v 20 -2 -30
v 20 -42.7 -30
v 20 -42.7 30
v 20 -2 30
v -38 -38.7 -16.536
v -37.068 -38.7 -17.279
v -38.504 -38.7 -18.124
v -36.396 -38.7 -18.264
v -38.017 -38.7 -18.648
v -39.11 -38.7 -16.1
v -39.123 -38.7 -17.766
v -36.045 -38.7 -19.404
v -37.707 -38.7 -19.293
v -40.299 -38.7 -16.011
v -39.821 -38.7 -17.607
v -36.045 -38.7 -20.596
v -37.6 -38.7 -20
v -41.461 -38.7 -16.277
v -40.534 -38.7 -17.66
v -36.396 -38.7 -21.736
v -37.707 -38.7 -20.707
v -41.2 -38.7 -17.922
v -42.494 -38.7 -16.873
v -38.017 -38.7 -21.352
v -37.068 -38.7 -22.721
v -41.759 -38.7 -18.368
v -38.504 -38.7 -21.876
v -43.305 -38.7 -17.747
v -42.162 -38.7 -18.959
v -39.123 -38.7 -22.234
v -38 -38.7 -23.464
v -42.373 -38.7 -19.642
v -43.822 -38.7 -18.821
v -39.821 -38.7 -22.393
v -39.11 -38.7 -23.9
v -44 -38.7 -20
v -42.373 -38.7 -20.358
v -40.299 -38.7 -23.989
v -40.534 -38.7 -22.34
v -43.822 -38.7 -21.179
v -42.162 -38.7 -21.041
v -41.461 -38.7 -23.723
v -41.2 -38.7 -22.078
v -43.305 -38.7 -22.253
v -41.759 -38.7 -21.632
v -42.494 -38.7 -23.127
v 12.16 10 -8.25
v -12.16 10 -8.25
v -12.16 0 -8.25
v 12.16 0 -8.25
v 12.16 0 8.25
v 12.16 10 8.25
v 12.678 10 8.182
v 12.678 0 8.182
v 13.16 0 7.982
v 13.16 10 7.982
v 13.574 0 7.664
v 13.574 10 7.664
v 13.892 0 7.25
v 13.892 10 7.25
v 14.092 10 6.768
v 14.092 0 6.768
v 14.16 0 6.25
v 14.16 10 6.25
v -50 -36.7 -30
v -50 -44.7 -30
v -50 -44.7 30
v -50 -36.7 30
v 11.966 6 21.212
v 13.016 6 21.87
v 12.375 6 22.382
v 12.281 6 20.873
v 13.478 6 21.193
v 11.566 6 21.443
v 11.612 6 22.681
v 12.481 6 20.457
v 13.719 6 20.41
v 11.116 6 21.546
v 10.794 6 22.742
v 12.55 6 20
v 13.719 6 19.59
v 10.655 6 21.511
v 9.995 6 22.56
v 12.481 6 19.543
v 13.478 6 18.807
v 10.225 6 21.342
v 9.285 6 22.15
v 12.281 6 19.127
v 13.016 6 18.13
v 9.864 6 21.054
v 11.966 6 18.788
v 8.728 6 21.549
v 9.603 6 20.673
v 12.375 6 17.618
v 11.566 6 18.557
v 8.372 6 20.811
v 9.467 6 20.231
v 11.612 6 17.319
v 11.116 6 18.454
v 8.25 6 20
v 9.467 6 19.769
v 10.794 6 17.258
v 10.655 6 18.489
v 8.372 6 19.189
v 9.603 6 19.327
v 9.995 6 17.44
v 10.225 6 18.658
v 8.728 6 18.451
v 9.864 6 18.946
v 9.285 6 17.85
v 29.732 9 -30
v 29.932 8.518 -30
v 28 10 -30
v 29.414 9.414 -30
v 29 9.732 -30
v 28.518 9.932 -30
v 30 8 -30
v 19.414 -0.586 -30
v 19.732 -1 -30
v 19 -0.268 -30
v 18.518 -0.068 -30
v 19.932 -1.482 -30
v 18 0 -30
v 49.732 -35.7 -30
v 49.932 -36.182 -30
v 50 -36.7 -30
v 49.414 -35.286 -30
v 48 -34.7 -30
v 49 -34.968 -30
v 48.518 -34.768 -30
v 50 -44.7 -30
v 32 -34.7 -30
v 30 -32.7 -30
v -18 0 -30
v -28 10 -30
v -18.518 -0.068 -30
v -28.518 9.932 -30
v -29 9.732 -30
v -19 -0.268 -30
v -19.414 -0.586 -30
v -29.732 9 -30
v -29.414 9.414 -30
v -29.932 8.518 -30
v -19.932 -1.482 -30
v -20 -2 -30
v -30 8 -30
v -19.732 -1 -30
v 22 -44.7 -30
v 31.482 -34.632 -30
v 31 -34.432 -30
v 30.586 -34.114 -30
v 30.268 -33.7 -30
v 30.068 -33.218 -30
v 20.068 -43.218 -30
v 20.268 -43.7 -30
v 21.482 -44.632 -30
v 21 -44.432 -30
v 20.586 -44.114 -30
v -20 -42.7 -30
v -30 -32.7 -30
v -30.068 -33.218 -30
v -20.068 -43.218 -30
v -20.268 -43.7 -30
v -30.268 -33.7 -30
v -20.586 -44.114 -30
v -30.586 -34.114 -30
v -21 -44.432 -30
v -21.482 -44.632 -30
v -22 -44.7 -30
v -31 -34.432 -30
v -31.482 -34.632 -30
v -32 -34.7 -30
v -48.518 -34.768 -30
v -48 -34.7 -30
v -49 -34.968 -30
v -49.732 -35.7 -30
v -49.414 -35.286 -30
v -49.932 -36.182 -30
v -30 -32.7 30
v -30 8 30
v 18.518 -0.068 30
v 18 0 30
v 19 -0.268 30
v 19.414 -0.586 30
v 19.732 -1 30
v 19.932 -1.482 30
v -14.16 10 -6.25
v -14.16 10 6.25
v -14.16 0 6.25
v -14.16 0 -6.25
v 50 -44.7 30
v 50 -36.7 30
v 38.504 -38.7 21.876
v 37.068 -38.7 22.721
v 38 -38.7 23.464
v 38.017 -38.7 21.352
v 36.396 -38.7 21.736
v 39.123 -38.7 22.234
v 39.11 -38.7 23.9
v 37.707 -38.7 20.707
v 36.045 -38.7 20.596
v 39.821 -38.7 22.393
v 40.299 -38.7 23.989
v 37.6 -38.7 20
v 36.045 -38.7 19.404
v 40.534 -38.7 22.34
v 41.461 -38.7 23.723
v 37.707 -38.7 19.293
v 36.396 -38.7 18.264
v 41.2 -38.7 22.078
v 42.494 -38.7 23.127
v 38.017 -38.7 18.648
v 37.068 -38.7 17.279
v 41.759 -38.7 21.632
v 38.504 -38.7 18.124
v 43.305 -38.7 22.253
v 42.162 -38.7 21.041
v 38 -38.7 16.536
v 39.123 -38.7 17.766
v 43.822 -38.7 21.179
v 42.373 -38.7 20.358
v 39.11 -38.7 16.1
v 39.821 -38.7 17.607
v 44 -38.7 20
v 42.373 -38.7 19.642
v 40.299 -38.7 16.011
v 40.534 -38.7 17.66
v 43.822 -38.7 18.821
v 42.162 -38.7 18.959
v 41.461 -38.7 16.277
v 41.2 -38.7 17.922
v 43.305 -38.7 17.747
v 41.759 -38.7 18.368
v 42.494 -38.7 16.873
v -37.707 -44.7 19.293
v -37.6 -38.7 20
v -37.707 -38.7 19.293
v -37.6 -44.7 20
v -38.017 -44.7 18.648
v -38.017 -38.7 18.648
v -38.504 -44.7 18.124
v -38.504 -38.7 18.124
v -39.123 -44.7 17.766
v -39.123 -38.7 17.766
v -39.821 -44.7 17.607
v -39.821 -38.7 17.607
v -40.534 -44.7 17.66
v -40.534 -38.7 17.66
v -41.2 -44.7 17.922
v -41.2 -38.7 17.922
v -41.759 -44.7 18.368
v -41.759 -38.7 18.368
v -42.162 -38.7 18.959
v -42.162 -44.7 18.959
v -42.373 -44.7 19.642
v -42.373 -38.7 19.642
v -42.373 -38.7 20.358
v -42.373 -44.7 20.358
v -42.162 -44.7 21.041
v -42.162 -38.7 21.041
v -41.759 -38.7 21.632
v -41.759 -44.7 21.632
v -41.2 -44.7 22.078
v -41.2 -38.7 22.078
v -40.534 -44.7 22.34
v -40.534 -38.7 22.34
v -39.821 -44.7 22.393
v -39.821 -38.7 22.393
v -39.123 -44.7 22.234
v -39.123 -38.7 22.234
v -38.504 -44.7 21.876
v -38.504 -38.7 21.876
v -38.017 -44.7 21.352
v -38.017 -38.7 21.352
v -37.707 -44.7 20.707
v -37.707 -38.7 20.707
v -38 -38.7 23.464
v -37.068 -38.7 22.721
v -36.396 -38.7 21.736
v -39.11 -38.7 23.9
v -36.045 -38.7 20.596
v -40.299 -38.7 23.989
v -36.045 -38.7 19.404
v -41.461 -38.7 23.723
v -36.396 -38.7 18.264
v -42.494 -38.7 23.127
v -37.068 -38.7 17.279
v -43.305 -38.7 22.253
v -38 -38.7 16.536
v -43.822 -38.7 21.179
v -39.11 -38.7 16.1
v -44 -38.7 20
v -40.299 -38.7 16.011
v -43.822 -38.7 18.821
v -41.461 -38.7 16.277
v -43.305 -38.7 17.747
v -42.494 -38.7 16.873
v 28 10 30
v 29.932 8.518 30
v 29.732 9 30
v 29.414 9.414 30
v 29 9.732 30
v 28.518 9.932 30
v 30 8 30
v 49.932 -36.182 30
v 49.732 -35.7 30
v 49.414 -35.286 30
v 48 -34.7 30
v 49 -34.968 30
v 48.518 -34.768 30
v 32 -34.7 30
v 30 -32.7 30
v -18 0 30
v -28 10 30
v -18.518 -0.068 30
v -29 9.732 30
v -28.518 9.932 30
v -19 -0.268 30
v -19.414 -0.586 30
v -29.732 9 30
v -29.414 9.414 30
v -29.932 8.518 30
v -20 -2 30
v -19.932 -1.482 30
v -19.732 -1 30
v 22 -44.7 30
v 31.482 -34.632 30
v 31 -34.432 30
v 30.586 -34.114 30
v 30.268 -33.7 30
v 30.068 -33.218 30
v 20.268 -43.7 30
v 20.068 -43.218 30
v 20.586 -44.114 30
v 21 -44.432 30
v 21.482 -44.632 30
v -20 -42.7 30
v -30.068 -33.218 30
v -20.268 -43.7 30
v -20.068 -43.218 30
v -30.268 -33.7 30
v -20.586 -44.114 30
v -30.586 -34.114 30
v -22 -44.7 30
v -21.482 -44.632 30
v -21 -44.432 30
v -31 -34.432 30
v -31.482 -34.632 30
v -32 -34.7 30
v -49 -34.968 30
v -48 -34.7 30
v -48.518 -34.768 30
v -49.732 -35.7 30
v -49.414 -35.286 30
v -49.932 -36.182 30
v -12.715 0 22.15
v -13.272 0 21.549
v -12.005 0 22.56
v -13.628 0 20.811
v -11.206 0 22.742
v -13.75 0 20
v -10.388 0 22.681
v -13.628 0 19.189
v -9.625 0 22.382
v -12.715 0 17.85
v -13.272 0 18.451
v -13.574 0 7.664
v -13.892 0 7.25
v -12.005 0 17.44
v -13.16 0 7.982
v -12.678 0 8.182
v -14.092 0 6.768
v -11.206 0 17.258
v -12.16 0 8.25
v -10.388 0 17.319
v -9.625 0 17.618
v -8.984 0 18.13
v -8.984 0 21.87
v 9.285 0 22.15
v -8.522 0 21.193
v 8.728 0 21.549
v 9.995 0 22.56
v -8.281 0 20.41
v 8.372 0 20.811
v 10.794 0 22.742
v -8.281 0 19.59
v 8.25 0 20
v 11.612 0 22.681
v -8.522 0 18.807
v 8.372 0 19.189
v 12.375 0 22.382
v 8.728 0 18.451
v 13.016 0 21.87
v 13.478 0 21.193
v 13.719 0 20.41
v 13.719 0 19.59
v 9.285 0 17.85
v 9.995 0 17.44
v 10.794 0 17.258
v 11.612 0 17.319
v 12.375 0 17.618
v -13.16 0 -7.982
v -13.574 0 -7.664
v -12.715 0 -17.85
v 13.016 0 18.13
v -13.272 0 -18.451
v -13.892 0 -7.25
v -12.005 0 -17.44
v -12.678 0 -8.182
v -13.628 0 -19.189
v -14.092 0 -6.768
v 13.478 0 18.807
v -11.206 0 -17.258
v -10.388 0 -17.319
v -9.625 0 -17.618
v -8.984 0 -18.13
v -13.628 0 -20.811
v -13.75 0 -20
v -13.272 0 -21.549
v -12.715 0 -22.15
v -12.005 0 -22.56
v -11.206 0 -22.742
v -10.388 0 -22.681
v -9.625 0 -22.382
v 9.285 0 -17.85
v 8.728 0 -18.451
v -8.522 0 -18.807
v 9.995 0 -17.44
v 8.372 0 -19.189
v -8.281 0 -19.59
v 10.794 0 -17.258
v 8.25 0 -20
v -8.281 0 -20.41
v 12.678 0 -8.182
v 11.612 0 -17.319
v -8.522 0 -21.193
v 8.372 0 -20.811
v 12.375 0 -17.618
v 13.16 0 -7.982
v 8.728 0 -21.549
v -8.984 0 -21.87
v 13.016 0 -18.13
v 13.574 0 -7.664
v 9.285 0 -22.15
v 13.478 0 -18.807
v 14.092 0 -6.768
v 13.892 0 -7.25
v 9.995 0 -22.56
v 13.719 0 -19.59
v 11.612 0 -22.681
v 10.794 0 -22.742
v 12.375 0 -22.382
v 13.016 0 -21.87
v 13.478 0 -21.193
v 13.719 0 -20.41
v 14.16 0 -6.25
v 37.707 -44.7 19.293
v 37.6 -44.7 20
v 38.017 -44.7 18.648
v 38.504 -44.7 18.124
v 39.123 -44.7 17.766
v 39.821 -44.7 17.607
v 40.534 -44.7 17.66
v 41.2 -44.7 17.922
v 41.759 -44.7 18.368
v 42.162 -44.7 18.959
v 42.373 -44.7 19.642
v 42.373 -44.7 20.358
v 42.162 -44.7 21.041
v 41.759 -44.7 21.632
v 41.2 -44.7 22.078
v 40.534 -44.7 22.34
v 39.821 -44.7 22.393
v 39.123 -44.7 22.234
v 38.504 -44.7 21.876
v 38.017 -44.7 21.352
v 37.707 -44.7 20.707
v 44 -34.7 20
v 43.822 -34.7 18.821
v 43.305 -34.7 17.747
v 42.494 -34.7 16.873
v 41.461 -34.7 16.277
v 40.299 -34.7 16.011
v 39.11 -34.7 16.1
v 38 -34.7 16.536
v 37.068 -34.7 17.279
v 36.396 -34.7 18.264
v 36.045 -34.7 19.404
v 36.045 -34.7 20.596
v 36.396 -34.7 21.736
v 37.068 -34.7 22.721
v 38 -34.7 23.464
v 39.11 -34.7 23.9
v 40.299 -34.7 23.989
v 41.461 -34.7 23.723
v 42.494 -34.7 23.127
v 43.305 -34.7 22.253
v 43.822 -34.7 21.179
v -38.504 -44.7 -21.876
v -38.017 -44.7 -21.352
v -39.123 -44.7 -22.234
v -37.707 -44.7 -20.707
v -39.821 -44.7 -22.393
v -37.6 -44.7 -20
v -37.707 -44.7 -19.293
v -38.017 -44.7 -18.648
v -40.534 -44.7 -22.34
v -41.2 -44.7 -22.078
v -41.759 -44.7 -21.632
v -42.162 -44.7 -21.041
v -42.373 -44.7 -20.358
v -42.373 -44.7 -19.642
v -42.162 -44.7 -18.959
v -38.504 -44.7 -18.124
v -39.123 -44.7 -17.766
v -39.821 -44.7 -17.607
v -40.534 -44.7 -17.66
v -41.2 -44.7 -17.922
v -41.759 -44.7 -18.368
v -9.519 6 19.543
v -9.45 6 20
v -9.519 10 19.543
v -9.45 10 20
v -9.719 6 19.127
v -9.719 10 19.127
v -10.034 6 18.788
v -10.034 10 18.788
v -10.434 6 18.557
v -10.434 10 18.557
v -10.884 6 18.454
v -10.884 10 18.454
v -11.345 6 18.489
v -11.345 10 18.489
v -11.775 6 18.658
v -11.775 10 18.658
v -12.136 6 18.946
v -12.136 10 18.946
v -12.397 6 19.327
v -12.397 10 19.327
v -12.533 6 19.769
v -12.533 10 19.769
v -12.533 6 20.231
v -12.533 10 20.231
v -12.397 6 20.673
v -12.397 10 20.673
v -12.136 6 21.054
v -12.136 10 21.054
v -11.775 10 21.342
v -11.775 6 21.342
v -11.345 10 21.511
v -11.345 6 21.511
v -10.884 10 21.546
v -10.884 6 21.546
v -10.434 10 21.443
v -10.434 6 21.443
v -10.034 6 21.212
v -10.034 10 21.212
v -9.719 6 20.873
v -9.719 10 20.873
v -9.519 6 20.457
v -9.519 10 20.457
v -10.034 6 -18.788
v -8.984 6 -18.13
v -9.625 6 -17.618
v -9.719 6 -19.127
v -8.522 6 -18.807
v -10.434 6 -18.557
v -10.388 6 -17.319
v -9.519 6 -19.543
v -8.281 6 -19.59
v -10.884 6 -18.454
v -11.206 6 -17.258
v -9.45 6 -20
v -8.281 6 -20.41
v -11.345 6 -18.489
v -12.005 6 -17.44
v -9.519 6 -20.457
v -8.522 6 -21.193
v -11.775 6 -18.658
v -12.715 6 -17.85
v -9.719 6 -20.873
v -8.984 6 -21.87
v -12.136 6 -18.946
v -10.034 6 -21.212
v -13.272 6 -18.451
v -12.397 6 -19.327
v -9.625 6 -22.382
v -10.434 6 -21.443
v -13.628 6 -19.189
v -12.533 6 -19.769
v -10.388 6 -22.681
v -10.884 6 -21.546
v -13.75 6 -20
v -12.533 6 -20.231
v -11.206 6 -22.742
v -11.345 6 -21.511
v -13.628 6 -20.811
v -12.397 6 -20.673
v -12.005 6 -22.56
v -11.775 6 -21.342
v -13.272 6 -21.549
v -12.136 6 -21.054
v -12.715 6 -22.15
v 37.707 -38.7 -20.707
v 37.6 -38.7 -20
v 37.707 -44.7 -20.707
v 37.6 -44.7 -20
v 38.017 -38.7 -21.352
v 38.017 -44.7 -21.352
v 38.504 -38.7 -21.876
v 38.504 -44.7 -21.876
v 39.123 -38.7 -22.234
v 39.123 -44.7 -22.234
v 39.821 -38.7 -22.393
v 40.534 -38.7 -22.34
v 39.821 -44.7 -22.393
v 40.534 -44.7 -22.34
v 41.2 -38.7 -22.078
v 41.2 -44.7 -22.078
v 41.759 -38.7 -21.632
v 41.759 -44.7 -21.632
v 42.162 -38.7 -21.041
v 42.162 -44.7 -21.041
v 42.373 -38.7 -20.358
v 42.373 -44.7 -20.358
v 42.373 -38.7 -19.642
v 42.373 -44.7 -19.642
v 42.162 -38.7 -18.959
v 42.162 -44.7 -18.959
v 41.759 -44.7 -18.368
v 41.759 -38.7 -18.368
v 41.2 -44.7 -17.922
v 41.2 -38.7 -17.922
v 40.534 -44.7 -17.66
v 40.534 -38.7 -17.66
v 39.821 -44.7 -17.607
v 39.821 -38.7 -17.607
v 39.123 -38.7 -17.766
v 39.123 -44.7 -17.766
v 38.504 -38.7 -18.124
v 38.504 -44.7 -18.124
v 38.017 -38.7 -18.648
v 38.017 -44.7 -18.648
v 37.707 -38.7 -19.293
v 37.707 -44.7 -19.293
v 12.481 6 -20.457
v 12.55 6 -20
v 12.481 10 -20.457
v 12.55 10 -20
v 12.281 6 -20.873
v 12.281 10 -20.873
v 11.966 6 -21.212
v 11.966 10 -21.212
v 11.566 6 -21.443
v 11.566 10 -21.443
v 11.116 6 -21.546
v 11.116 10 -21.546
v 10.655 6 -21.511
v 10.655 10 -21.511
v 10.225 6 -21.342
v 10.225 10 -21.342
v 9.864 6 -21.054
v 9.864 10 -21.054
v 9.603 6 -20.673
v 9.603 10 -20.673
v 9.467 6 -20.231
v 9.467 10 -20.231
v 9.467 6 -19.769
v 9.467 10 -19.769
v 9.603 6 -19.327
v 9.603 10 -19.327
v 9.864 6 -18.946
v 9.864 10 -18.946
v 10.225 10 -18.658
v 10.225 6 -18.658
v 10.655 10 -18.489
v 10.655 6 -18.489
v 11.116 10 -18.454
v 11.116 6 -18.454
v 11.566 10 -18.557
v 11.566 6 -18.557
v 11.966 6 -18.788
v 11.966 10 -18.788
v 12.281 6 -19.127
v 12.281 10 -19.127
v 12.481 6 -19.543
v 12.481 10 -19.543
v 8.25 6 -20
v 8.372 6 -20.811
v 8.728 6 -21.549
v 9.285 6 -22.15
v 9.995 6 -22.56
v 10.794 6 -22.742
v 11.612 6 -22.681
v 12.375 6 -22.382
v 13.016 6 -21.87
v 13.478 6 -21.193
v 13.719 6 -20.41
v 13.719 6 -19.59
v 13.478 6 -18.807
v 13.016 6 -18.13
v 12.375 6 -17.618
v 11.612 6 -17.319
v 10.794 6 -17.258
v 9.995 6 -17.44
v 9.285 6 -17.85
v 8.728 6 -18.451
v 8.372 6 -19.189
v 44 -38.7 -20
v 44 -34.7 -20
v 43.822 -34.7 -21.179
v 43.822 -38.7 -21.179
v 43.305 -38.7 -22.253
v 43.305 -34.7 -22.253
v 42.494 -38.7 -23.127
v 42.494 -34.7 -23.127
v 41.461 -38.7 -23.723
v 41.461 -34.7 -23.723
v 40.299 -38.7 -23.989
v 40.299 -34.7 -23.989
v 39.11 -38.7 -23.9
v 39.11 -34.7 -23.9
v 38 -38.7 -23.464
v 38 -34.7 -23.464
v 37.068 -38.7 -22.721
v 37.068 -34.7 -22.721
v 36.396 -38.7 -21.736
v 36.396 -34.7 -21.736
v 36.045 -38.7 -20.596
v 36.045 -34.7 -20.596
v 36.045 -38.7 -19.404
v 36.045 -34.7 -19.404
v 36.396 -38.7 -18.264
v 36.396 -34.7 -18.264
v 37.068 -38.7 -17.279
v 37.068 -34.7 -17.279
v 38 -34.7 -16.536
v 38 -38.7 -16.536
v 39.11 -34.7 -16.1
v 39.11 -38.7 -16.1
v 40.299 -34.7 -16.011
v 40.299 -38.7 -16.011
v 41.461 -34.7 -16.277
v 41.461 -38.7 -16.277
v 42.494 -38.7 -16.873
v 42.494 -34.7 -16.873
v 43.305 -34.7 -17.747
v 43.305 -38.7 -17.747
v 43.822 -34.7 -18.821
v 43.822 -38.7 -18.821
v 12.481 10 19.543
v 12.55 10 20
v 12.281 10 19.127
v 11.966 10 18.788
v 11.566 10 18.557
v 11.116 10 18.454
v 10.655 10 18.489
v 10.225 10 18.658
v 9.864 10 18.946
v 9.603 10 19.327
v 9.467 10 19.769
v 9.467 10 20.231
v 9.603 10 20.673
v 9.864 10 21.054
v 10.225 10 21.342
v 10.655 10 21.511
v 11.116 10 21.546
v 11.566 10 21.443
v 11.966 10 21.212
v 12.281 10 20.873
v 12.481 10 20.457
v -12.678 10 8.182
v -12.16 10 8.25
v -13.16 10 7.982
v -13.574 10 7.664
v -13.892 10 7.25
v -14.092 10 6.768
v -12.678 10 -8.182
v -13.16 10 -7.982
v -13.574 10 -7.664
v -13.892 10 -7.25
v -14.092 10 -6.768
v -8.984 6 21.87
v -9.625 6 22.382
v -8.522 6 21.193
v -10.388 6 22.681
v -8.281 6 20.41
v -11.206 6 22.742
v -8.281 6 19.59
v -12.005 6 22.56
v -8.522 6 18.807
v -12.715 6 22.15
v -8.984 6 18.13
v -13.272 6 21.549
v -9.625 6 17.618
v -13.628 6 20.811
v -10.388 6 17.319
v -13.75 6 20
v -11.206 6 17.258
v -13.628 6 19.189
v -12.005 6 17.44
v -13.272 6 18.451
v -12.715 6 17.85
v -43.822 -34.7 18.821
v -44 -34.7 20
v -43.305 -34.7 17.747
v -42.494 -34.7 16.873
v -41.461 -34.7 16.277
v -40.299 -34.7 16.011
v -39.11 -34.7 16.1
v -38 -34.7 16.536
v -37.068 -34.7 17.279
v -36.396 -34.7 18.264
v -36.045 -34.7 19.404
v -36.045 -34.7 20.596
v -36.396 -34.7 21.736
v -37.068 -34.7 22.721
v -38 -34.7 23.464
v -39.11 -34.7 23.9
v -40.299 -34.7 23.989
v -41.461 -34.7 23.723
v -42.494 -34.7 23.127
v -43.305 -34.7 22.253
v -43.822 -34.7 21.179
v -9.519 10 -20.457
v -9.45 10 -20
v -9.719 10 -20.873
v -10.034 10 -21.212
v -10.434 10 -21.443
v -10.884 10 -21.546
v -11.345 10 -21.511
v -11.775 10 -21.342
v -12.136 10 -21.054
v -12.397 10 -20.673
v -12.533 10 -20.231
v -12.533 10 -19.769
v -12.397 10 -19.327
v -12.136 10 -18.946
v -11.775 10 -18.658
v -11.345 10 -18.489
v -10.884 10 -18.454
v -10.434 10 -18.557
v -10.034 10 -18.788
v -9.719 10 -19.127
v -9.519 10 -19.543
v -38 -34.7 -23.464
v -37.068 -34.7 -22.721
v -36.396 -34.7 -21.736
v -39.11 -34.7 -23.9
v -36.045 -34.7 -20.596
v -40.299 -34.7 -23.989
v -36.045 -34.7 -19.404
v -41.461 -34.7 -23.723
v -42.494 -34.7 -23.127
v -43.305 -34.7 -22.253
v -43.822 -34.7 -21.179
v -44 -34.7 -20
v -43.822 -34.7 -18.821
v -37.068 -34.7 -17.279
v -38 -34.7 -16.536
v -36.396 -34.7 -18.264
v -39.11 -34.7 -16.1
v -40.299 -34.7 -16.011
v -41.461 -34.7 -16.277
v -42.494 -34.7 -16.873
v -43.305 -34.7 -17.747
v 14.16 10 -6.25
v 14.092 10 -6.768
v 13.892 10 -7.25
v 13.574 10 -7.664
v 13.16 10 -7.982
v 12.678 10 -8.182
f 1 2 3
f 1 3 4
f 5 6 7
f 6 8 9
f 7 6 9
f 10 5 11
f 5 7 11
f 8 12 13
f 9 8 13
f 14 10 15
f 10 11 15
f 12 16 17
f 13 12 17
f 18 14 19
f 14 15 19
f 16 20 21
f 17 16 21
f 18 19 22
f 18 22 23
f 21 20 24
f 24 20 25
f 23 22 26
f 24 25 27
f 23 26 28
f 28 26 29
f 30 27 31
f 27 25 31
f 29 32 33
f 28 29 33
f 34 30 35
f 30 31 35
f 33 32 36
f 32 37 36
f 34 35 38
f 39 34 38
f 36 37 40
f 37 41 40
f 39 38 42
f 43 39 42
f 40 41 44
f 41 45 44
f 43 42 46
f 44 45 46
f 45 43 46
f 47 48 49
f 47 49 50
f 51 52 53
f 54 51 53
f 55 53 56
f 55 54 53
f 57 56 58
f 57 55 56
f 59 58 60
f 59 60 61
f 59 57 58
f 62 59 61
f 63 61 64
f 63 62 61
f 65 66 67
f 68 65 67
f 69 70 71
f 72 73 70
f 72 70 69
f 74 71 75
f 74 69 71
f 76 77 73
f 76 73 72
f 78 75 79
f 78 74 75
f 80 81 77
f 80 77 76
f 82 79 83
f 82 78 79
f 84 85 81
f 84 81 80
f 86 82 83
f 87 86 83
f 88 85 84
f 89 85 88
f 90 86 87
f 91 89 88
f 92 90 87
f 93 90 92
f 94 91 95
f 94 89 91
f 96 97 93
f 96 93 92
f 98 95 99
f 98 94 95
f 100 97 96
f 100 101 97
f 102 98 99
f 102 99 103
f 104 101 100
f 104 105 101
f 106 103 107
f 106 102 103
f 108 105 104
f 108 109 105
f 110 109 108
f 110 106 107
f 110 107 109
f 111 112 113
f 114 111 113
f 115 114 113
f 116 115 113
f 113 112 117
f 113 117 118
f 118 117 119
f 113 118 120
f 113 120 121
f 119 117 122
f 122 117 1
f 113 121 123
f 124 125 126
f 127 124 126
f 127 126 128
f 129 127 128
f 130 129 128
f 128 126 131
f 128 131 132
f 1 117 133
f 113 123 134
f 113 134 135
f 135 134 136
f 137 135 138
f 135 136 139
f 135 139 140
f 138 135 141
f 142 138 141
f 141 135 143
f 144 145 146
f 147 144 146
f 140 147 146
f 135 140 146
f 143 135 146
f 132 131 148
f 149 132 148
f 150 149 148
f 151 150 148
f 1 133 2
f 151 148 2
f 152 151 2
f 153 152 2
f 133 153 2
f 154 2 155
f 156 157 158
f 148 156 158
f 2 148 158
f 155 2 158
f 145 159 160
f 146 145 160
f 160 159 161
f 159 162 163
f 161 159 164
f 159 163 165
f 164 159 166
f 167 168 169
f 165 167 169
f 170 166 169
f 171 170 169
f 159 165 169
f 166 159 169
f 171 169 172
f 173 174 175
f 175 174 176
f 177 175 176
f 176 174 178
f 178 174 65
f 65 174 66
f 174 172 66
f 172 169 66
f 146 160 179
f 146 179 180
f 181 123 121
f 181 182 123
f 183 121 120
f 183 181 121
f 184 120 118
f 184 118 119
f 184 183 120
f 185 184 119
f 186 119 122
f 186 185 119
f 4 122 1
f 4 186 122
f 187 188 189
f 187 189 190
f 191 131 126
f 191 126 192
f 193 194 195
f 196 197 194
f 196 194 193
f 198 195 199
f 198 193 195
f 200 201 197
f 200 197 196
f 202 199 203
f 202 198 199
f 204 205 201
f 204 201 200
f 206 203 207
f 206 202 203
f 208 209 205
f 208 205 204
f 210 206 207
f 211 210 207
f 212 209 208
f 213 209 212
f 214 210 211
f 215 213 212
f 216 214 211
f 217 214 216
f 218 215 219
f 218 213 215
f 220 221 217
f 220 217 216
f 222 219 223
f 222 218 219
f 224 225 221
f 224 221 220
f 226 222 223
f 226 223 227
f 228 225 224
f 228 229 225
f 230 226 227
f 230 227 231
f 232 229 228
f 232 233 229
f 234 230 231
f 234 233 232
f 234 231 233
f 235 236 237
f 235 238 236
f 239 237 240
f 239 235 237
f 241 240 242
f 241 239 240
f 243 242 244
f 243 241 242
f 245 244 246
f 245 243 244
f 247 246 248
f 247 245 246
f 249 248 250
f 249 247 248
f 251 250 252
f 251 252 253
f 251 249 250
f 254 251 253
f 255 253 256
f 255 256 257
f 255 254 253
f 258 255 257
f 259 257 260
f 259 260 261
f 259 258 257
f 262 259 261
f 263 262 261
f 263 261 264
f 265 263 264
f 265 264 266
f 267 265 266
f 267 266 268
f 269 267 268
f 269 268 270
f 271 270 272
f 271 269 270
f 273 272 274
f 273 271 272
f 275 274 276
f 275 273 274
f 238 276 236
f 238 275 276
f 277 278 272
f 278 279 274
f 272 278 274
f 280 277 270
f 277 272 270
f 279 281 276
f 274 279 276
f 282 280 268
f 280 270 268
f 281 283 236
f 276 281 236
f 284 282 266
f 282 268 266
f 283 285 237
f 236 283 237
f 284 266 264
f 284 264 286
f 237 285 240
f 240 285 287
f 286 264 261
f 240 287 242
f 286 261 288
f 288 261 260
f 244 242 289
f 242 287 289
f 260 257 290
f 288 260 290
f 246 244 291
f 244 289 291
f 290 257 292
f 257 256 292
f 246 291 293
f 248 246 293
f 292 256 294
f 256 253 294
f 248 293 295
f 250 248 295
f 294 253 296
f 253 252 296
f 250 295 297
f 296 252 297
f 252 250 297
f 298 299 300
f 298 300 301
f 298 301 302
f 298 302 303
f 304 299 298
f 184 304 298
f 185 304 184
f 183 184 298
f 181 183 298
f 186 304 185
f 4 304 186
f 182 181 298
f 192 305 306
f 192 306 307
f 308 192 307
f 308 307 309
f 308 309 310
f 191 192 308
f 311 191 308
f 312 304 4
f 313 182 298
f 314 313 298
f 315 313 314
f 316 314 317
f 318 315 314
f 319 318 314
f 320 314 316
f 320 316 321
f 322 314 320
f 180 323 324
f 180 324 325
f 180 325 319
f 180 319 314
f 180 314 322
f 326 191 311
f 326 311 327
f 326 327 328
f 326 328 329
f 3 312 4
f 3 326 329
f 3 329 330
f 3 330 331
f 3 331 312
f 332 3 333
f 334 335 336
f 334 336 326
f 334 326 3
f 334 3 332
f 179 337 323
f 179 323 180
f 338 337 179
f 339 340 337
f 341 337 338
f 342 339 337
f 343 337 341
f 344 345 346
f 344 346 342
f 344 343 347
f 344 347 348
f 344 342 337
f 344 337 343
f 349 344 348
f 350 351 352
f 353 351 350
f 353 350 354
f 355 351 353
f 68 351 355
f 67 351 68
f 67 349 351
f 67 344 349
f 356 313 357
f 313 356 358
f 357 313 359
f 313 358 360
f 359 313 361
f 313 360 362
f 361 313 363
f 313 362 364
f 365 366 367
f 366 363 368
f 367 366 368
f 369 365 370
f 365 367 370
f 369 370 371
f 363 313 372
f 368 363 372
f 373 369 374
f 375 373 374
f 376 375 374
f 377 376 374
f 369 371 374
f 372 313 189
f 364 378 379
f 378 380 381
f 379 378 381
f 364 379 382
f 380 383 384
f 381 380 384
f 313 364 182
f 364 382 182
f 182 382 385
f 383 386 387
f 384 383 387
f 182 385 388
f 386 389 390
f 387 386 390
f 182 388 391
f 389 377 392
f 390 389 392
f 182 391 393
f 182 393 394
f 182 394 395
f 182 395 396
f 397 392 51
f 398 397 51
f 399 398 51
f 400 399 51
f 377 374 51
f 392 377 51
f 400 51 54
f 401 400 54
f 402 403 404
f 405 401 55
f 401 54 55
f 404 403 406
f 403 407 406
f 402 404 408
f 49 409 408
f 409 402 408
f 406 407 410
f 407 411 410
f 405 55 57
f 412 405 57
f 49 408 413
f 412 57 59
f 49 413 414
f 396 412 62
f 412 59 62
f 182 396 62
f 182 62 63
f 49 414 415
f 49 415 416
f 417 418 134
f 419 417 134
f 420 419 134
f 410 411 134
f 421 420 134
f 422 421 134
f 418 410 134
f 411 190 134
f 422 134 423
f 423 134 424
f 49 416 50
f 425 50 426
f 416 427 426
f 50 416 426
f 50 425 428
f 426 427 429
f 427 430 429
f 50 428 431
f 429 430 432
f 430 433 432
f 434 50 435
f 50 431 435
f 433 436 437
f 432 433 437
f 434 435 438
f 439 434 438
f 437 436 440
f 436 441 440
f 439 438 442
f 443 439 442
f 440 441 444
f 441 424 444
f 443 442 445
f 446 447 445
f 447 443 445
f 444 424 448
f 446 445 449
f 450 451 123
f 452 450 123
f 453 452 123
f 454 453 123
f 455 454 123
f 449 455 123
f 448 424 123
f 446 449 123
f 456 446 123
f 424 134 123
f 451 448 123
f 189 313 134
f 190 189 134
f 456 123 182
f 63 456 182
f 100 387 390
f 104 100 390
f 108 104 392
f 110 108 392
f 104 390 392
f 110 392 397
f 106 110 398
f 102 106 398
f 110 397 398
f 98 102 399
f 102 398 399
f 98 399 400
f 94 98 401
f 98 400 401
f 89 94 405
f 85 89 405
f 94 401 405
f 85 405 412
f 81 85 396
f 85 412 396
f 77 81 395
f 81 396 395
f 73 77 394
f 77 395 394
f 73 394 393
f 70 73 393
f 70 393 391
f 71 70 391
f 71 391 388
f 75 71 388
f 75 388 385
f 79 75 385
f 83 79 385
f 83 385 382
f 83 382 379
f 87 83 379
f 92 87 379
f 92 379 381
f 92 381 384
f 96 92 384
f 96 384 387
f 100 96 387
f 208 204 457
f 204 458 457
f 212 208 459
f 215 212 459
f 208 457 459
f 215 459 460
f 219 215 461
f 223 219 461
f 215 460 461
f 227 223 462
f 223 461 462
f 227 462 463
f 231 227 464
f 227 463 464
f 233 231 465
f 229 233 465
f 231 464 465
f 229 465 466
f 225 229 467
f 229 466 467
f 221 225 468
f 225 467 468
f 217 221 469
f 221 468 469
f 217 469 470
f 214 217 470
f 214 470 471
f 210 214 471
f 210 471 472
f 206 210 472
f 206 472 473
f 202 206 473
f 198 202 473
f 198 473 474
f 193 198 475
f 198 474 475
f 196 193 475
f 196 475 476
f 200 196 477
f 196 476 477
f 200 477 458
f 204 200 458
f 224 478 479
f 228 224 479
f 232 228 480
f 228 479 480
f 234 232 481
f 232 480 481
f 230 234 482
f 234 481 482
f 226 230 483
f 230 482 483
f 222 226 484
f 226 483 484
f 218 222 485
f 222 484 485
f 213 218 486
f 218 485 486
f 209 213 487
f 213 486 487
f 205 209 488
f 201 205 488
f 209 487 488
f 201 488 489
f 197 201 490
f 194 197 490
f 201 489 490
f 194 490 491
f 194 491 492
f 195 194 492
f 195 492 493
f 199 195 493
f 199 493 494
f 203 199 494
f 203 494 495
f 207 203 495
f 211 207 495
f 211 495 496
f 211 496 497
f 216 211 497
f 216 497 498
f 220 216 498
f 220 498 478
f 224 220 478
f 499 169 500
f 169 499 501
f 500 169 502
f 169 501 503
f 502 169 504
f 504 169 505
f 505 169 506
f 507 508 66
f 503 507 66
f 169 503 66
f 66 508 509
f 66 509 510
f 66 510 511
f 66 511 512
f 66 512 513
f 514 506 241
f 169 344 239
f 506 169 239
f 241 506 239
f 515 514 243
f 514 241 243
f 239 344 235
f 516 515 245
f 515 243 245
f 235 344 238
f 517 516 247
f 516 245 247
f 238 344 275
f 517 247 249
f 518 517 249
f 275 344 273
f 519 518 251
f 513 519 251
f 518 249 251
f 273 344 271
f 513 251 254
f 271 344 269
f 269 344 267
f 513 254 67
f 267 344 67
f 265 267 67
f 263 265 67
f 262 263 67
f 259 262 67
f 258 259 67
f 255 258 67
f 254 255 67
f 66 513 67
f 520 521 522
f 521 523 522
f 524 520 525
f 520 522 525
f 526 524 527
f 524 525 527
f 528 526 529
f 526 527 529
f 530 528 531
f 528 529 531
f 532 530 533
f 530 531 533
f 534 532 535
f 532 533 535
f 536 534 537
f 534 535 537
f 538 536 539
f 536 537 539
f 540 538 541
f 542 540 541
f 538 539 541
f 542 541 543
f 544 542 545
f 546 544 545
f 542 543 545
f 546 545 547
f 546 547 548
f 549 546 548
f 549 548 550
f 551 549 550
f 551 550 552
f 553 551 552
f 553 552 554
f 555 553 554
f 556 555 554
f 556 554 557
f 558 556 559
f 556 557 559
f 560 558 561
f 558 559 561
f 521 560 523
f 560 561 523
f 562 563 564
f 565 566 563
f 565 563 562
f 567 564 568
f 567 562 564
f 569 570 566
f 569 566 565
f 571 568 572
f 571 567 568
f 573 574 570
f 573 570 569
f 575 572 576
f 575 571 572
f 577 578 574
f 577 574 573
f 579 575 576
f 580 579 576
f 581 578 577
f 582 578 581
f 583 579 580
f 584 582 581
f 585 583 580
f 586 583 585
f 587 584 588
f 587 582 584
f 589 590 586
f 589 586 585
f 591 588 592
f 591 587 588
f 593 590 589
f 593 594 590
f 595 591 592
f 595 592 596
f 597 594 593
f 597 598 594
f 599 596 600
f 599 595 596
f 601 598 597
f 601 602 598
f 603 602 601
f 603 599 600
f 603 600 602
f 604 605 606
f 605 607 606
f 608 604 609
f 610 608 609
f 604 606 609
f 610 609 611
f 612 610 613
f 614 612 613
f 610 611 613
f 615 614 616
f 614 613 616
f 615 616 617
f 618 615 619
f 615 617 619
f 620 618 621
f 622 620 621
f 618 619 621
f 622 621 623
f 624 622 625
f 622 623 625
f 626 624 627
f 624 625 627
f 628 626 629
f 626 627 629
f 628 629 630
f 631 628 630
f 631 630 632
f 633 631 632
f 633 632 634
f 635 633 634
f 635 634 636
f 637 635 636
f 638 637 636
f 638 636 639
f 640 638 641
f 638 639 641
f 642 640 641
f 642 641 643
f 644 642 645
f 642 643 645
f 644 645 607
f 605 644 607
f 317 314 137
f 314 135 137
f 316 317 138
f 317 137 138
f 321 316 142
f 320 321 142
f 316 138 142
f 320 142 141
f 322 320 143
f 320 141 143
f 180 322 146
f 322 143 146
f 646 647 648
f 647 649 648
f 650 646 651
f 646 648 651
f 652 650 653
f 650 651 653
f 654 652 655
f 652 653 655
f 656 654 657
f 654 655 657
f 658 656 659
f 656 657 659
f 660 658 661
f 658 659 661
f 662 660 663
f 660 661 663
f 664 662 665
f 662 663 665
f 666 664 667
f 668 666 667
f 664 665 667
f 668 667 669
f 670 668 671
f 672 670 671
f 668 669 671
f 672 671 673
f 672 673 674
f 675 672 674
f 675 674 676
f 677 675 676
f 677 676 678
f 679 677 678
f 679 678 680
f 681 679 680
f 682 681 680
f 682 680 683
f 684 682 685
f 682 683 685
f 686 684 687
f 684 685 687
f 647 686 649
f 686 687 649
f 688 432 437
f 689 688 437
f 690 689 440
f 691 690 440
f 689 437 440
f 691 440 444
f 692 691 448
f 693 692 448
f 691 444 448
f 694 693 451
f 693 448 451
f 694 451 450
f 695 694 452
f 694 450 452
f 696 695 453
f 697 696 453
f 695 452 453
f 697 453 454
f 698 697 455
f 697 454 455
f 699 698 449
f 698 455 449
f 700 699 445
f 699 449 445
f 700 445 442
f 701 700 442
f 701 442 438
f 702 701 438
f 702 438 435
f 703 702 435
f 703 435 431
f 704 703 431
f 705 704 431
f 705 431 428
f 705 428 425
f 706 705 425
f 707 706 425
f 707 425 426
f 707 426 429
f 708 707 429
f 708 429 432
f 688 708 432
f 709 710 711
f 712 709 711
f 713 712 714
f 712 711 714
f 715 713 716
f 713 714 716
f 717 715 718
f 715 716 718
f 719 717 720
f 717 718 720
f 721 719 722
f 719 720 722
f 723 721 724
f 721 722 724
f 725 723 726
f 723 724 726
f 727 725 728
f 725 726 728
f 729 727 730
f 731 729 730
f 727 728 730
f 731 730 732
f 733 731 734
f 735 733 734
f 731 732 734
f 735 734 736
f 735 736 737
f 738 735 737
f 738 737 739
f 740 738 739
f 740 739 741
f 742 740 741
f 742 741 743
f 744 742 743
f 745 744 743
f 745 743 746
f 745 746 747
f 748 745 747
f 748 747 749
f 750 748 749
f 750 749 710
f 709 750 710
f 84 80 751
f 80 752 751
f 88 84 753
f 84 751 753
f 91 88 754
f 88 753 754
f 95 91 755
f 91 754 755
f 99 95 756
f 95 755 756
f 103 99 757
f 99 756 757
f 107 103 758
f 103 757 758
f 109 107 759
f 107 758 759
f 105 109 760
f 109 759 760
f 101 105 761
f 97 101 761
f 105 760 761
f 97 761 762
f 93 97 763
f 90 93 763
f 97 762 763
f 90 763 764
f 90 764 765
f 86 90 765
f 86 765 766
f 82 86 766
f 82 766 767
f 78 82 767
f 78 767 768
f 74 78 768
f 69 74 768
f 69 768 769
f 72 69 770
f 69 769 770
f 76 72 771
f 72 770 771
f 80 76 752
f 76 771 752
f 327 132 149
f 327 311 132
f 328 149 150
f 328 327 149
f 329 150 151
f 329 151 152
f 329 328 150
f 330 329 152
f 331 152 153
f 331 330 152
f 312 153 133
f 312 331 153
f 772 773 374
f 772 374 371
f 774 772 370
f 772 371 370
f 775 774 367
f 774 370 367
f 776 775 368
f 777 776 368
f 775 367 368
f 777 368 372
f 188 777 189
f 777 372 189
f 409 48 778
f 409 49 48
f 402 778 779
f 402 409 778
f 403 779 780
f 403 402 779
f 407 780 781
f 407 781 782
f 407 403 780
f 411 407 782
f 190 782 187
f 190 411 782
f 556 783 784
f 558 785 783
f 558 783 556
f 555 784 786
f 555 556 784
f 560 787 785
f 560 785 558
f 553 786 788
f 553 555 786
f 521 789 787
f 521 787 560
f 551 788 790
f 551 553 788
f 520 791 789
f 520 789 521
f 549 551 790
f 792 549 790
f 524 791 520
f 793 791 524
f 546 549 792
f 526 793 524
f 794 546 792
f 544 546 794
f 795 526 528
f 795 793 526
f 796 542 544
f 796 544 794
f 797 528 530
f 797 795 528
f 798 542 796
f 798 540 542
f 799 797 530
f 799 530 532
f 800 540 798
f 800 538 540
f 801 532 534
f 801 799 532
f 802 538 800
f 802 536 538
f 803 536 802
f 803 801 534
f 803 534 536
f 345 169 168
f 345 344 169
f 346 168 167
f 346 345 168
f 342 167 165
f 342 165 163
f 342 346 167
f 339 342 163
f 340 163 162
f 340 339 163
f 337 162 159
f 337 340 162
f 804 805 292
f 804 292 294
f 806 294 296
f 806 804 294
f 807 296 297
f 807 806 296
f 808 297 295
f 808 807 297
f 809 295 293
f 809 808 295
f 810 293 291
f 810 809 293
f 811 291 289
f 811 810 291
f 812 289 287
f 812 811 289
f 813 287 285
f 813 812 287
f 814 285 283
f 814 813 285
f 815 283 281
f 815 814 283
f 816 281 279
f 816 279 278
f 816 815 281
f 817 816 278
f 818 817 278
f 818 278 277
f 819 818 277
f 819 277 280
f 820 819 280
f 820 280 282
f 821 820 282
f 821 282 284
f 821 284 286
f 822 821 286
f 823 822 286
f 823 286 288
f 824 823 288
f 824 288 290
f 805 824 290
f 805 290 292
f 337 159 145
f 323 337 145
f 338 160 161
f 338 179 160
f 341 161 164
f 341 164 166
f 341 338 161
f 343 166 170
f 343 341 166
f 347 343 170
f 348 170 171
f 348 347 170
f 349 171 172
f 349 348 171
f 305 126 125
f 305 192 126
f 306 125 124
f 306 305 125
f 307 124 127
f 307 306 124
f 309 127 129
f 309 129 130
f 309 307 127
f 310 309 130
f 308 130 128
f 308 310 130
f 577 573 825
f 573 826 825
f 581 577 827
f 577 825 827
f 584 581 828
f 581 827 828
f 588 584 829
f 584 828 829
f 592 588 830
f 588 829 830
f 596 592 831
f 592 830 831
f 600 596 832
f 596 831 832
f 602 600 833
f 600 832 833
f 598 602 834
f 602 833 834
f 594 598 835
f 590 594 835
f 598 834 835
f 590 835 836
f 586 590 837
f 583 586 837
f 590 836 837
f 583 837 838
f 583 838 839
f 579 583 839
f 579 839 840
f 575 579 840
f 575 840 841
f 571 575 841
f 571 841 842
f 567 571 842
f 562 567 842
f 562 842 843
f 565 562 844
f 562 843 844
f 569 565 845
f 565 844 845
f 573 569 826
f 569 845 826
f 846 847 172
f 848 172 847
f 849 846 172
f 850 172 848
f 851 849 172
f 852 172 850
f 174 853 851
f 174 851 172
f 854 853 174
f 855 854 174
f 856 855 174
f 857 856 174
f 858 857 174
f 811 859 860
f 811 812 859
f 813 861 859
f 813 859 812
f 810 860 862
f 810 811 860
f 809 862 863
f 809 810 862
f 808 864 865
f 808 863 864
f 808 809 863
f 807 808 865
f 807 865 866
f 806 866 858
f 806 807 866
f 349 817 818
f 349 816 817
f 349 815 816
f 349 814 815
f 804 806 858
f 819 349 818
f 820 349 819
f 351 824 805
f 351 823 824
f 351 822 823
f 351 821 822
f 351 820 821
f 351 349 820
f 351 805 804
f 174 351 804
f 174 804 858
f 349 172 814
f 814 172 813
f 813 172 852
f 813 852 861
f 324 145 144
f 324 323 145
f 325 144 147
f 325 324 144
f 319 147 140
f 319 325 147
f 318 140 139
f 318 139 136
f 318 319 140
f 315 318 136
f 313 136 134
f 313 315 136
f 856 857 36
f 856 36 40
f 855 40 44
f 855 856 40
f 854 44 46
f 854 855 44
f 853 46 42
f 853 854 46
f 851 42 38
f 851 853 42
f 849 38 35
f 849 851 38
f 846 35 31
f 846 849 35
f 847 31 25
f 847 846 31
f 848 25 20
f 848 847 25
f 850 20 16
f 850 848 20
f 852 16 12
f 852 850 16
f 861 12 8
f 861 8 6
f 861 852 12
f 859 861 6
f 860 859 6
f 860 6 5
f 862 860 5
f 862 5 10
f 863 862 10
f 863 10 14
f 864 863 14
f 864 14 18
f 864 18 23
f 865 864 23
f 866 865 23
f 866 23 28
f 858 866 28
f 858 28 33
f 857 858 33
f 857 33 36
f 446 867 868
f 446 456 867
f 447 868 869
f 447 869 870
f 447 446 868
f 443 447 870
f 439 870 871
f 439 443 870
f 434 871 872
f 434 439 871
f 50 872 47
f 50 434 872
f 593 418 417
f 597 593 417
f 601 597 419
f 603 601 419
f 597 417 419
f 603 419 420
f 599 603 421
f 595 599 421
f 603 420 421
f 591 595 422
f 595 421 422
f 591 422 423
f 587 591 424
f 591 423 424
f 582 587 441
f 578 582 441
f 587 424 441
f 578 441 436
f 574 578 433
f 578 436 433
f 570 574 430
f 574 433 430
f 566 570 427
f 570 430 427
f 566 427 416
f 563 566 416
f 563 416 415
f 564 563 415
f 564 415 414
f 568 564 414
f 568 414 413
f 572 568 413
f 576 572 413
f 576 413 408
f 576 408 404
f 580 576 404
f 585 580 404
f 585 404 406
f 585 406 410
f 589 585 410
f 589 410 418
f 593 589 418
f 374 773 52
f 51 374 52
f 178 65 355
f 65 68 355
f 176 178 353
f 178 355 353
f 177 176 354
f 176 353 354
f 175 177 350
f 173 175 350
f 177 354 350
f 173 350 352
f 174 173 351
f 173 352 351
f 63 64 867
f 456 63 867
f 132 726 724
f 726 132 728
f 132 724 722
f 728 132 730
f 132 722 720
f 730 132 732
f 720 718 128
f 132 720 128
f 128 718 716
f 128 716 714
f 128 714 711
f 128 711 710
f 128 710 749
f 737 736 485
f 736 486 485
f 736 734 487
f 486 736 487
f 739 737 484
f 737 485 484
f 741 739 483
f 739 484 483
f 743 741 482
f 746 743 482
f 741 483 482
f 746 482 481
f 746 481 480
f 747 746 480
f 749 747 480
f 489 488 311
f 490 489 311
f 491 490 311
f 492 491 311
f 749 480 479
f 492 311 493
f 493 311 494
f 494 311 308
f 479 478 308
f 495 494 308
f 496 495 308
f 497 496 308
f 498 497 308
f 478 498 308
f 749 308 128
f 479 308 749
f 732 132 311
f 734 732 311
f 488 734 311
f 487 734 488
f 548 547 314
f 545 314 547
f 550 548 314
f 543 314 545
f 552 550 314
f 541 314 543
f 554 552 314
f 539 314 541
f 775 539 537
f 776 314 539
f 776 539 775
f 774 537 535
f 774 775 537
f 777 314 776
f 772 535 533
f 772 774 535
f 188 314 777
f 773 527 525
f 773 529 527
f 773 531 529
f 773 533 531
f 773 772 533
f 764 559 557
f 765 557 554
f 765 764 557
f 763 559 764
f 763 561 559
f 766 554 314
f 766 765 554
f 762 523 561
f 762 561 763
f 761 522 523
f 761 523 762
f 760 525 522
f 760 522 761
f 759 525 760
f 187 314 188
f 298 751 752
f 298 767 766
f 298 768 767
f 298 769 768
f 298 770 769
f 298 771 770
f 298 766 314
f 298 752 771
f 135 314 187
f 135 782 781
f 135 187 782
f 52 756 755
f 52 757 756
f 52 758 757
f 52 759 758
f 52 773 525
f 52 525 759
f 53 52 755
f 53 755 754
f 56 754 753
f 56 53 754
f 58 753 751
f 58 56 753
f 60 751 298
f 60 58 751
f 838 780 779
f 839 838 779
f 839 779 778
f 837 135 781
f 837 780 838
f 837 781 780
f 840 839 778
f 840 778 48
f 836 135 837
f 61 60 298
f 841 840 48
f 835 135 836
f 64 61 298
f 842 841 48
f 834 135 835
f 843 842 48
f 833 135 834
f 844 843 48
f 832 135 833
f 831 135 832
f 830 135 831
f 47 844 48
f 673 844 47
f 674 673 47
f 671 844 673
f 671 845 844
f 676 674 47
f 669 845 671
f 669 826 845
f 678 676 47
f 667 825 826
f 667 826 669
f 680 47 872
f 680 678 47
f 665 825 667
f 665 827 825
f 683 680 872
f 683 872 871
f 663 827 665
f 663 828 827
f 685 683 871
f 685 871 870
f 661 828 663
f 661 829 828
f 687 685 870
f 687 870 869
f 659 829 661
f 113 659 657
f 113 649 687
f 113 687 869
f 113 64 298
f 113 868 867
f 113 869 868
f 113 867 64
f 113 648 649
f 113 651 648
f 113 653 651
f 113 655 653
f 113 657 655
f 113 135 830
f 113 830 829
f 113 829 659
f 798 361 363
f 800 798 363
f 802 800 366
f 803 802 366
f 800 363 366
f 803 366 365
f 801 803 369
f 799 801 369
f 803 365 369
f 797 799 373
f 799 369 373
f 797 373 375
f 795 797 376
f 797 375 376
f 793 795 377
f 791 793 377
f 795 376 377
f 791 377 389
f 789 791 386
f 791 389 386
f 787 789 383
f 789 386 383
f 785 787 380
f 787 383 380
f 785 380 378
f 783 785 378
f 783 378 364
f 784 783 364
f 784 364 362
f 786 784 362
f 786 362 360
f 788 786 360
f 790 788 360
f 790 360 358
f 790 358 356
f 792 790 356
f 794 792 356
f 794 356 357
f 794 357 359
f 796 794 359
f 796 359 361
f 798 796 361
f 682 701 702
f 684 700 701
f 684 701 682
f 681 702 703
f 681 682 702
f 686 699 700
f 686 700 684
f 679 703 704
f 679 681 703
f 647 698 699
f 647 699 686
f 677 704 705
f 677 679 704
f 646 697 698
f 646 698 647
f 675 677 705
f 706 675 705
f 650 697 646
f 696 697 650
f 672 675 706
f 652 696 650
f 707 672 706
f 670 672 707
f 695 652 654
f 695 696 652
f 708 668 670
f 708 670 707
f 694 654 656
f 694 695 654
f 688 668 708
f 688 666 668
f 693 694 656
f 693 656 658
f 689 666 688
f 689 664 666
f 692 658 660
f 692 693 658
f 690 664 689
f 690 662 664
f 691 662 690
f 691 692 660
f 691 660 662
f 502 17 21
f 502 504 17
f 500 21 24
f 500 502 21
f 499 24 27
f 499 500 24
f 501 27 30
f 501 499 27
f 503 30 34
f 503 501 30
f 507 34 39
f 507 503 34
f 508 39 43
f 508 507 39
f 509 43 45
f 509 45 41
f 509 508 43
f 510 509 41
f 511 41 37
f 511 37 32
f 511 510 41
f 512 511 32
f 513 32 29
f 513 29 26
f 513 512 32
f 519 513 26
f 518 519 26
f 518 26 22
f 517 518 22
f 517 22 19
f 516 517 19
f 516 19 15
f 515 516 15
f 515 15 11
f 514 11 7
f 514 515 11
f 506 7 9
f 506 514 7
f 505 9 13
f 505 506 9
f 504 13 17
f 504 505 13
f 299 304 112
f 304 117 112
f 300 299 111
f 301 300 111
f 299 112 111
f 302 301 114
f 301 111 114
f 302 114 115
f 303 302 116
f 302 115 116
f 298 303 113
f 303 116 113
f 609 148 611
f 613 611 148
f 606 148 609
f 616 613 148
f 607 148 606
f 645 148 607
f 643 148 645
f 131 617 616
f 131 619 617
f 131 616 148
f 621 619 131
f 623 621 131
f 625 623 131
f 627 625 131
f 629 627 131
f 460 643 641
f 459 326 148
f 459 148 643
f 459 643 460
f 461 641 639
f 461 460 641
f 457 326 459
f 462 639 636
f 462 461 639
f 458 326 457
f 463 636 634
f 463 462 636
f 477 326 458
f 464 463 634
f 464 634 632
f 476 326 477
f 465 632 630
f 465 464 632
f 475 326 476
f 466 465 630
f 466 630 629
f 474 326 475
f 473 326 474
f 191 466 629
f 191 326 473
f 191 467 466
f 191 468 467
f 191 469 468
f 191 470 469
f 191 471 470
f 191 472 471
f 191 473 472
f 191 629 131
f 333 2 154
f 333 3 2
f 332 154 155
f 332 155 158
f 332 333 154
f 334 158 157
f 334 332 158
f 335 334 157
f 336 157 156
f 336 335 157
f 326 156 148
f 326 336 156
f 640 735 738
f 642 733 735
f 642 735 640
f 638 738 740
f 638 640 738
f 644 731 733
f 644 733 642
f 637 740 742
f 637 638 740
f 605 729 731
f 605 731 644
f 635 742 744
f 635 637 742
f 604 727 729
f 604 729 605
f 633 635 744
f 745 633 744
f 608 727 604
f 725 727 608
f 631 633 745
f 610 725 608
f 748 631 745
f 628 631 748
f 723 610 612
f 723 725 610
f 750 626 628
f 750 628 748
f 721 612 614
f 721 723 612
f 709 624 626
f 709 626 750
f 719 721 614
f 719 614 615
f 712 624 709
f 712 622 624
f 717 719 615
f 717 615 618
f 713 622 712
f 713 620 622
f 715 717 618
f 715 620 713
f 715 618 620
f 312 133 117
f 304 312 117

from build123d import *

# Parameters (mm, degrees)
SKETCH2_W                        = 60
SKETCH2_H                        = 60
BOSS_EXTRUDE1_DEPTH              = 10
SKETCH7_W                        = 28.32
SKETCH7_H                        = 16.5
CUT_EXTRUDE2_DEPTH               = 44.588989435
FILLET2_R                        = 2
CBORE_FOR_M2_5_SHCS2_D           = 3.1
CBORE_FOR_M2_5_SHCS2_CBORE_D     = 5.5
CBORE_FOR_M2_5_SHCS2_CBORE_DEPTH = 2.5
MOVE_FACE1_BY                    = 3.5
MOVE_FACE1_2_BY                  = 3.5
MOVE_FACE1_3_BY                  = 3.5
MOVE_FACE1_4_BY                  = 3.5
SKETCH11_W                       = 10
SKETCH11_H                       = 44.7
BOSS_EXTRUDE2_DEPTH              = 60
SKETCH12_W                       = 20
SKETCH12_H                       = 60
BOSS_EXTRUDE3_DEPTH              = 10
CBORE_FOR_M4_SHCS1_D             = 4.8
CBORE_FOR_M4_SHCS1_CBORE_D       = 8
CBORE_FOR_M4_SHCS1_CBORE_DEPTH   = 4
FILLET5_R                        = 2


with BuildPart() as part:
    # Sketch2 → Boss-Extrude1 (new body)
    with BuildSketch(Plane(origin=(0, 0, 0), x_dir=(1, 0, 0), z_dir=(0, 1, 0))):
        Rectangle(SKETCH2_W, SKETCH2_H)
    extrude(amount=BOSS_EXTRUDE1_DEPTH)

    # Sketch7 → Cut-Extrude2 (cut, through all)
    with BuildSketch(Plane(origin=(0, 10, 0), x_dir=(1, 0, 0), z_dir=(0, 1, 0))):
        Rectangle(SKETCH7_W, SKETCH7_H)
    extrude(amount=-CUT_EXTRUDE2_DEPTH, mode=Mode.SUBTRACT)

    # Fillet2
    fillet2_edges = [part.edges().sort_by_distance(p)[0] for p in [
        (-14.16, 5, 8.25),
        (-14.16, 5, -8.25),
        (14.16, 5, -8.25),
        (14.16, 5, 8.25),
    ]]
    fillet(fillet2_edges, radius=FILLET2_R)

    # CBORE for M2.5 SHCS2 (through all)
    with Locations(Plane(origin=(0, 0, 0), x_dir=(-1, 0, 0), z_dir=(0, -1, 0))):
        with Locations((11, -20), (-11, -20), (11, 20), (-11, 20)):
            CounterBoreHole(CBORE_FOR_M2_5_SHCS2_D / 2, CBORE_FOR_M2_5_SHCS2_CBORE_D / 2, CBORE_FOR_M2_5_SHCS2_CBORE_DEPTH)

    # Move Face1: a face moved inward by 3.5
    extrude(part.faces().sort_by_distance((11, 2.5, -17.8))[0], amount=MOVE_FACE1_BY, dir=(0, 1, 0), mode=Mode.SUBTRACT)

    # Move Face1 2: a face moved inward by 3.5
    extrude(part.faces().sort_by_distance((-11, 2.5, -17.8))[0], amount=MOVE_FACE1_2_BY, dir=(0, 1, 0), mode=Mode.SUBTRACT)

    # Move Face1 3: a face moved inward by 3.5
    extrude(part.faces().sort_by_distance((11, 2.5, 22.2))[0], amount=MOVE_FACE1_3_BY, dir=(0, 1, 0), mode=Mode.SUBTRACT)

    # Move Face1 4: a face moved inward by 3.5
    extrude(part.faces().sort_by_distance((-11, 2.5, 22.2))[0], amount=MOVE_FACE1_4_BY, dir=(0, 1, 0), mode=Mode.SUBTRACT)

    # Sketch11 → Boss-Extrude2 (add)
    with BuildSketch(Plane(origin=(0, 0, -30), x_dir=(-1, 0, 0), z_dir=(0, 0, -1))):
        with Locations((-25, -22.35)):
            Rectangle(SKETCH11_W, SKETCH11_H)
    boss_extrude2 = extrude(amount=-BOSS_EXTRUDE2_DEPTH)

    # Sketch12 → Boss-Extrude3 (add)
    with BuildSketch(Plane.XZ.offset(44.7)):
        with Locations((40, 0)):
            Rectangle(SKETCH12_W, SKETCH12_H)
    boss_extrude3 = extrude(amount=-BOSS_EXTRUDE3_DEPTH)

    # CBORE for M4 SHCS1 (through all)
    with Locations(Plane(origin=(0, -34.7, 0), x_dir=(1, 0, 0), z_dir=(0, 1, 0))):
        with Locations((40, 20), (40, -20)):
            cbore_for_m4_shcs1 = CounterBoreHole(CBORE_FOR_M4_SHCS1_D / 2, CBORE_FOR_M4_SHCS1_CBORE_D / 2, CBORE_FOR_M4_SHCS1_CBORE_DEPTH)

    # Mirror1: Boss-Extrude2, Boss-Extrude3, CBORE for M4 SHCS1 across plane
    add(boss_extrude2.mirror(Plane(origin=(0, 0, 0), x_dir=(0, 0, 1), z_dir=(1, 0, 0))))
    add(boss_extrude3.mirror(Plane(origin=(0, 0, 0), x_dir=(0, 0, 1), z_dir=(1, 0, 0))))
    add(cbore_for_m4_shcs1.mirror(Plane(origin=(0, 0, 0), x_dir=(0, 0, 1), z_dir=(1, 0, 0))), mode=Mode.SUBTRACT)

    # Fillet5
    fillet5_edges = [part.edges().sort_by_distance(p)[0] for p in [
        (50, -34.7, 0),
        (30, -34.7, 0),
        (30, 10, 0),
        (-20, 0, 0),
        (-20, -44.7, 0),
        (-30, -34.7, 0),
        (-50, -34.7, 0),
        (-30, 10, 0),
        (20, 0, 0),
        (20, -44.7, 0),
    ]]
    fillet(fillet5_edges, radius=FILLET5_R)


solid = part.part
